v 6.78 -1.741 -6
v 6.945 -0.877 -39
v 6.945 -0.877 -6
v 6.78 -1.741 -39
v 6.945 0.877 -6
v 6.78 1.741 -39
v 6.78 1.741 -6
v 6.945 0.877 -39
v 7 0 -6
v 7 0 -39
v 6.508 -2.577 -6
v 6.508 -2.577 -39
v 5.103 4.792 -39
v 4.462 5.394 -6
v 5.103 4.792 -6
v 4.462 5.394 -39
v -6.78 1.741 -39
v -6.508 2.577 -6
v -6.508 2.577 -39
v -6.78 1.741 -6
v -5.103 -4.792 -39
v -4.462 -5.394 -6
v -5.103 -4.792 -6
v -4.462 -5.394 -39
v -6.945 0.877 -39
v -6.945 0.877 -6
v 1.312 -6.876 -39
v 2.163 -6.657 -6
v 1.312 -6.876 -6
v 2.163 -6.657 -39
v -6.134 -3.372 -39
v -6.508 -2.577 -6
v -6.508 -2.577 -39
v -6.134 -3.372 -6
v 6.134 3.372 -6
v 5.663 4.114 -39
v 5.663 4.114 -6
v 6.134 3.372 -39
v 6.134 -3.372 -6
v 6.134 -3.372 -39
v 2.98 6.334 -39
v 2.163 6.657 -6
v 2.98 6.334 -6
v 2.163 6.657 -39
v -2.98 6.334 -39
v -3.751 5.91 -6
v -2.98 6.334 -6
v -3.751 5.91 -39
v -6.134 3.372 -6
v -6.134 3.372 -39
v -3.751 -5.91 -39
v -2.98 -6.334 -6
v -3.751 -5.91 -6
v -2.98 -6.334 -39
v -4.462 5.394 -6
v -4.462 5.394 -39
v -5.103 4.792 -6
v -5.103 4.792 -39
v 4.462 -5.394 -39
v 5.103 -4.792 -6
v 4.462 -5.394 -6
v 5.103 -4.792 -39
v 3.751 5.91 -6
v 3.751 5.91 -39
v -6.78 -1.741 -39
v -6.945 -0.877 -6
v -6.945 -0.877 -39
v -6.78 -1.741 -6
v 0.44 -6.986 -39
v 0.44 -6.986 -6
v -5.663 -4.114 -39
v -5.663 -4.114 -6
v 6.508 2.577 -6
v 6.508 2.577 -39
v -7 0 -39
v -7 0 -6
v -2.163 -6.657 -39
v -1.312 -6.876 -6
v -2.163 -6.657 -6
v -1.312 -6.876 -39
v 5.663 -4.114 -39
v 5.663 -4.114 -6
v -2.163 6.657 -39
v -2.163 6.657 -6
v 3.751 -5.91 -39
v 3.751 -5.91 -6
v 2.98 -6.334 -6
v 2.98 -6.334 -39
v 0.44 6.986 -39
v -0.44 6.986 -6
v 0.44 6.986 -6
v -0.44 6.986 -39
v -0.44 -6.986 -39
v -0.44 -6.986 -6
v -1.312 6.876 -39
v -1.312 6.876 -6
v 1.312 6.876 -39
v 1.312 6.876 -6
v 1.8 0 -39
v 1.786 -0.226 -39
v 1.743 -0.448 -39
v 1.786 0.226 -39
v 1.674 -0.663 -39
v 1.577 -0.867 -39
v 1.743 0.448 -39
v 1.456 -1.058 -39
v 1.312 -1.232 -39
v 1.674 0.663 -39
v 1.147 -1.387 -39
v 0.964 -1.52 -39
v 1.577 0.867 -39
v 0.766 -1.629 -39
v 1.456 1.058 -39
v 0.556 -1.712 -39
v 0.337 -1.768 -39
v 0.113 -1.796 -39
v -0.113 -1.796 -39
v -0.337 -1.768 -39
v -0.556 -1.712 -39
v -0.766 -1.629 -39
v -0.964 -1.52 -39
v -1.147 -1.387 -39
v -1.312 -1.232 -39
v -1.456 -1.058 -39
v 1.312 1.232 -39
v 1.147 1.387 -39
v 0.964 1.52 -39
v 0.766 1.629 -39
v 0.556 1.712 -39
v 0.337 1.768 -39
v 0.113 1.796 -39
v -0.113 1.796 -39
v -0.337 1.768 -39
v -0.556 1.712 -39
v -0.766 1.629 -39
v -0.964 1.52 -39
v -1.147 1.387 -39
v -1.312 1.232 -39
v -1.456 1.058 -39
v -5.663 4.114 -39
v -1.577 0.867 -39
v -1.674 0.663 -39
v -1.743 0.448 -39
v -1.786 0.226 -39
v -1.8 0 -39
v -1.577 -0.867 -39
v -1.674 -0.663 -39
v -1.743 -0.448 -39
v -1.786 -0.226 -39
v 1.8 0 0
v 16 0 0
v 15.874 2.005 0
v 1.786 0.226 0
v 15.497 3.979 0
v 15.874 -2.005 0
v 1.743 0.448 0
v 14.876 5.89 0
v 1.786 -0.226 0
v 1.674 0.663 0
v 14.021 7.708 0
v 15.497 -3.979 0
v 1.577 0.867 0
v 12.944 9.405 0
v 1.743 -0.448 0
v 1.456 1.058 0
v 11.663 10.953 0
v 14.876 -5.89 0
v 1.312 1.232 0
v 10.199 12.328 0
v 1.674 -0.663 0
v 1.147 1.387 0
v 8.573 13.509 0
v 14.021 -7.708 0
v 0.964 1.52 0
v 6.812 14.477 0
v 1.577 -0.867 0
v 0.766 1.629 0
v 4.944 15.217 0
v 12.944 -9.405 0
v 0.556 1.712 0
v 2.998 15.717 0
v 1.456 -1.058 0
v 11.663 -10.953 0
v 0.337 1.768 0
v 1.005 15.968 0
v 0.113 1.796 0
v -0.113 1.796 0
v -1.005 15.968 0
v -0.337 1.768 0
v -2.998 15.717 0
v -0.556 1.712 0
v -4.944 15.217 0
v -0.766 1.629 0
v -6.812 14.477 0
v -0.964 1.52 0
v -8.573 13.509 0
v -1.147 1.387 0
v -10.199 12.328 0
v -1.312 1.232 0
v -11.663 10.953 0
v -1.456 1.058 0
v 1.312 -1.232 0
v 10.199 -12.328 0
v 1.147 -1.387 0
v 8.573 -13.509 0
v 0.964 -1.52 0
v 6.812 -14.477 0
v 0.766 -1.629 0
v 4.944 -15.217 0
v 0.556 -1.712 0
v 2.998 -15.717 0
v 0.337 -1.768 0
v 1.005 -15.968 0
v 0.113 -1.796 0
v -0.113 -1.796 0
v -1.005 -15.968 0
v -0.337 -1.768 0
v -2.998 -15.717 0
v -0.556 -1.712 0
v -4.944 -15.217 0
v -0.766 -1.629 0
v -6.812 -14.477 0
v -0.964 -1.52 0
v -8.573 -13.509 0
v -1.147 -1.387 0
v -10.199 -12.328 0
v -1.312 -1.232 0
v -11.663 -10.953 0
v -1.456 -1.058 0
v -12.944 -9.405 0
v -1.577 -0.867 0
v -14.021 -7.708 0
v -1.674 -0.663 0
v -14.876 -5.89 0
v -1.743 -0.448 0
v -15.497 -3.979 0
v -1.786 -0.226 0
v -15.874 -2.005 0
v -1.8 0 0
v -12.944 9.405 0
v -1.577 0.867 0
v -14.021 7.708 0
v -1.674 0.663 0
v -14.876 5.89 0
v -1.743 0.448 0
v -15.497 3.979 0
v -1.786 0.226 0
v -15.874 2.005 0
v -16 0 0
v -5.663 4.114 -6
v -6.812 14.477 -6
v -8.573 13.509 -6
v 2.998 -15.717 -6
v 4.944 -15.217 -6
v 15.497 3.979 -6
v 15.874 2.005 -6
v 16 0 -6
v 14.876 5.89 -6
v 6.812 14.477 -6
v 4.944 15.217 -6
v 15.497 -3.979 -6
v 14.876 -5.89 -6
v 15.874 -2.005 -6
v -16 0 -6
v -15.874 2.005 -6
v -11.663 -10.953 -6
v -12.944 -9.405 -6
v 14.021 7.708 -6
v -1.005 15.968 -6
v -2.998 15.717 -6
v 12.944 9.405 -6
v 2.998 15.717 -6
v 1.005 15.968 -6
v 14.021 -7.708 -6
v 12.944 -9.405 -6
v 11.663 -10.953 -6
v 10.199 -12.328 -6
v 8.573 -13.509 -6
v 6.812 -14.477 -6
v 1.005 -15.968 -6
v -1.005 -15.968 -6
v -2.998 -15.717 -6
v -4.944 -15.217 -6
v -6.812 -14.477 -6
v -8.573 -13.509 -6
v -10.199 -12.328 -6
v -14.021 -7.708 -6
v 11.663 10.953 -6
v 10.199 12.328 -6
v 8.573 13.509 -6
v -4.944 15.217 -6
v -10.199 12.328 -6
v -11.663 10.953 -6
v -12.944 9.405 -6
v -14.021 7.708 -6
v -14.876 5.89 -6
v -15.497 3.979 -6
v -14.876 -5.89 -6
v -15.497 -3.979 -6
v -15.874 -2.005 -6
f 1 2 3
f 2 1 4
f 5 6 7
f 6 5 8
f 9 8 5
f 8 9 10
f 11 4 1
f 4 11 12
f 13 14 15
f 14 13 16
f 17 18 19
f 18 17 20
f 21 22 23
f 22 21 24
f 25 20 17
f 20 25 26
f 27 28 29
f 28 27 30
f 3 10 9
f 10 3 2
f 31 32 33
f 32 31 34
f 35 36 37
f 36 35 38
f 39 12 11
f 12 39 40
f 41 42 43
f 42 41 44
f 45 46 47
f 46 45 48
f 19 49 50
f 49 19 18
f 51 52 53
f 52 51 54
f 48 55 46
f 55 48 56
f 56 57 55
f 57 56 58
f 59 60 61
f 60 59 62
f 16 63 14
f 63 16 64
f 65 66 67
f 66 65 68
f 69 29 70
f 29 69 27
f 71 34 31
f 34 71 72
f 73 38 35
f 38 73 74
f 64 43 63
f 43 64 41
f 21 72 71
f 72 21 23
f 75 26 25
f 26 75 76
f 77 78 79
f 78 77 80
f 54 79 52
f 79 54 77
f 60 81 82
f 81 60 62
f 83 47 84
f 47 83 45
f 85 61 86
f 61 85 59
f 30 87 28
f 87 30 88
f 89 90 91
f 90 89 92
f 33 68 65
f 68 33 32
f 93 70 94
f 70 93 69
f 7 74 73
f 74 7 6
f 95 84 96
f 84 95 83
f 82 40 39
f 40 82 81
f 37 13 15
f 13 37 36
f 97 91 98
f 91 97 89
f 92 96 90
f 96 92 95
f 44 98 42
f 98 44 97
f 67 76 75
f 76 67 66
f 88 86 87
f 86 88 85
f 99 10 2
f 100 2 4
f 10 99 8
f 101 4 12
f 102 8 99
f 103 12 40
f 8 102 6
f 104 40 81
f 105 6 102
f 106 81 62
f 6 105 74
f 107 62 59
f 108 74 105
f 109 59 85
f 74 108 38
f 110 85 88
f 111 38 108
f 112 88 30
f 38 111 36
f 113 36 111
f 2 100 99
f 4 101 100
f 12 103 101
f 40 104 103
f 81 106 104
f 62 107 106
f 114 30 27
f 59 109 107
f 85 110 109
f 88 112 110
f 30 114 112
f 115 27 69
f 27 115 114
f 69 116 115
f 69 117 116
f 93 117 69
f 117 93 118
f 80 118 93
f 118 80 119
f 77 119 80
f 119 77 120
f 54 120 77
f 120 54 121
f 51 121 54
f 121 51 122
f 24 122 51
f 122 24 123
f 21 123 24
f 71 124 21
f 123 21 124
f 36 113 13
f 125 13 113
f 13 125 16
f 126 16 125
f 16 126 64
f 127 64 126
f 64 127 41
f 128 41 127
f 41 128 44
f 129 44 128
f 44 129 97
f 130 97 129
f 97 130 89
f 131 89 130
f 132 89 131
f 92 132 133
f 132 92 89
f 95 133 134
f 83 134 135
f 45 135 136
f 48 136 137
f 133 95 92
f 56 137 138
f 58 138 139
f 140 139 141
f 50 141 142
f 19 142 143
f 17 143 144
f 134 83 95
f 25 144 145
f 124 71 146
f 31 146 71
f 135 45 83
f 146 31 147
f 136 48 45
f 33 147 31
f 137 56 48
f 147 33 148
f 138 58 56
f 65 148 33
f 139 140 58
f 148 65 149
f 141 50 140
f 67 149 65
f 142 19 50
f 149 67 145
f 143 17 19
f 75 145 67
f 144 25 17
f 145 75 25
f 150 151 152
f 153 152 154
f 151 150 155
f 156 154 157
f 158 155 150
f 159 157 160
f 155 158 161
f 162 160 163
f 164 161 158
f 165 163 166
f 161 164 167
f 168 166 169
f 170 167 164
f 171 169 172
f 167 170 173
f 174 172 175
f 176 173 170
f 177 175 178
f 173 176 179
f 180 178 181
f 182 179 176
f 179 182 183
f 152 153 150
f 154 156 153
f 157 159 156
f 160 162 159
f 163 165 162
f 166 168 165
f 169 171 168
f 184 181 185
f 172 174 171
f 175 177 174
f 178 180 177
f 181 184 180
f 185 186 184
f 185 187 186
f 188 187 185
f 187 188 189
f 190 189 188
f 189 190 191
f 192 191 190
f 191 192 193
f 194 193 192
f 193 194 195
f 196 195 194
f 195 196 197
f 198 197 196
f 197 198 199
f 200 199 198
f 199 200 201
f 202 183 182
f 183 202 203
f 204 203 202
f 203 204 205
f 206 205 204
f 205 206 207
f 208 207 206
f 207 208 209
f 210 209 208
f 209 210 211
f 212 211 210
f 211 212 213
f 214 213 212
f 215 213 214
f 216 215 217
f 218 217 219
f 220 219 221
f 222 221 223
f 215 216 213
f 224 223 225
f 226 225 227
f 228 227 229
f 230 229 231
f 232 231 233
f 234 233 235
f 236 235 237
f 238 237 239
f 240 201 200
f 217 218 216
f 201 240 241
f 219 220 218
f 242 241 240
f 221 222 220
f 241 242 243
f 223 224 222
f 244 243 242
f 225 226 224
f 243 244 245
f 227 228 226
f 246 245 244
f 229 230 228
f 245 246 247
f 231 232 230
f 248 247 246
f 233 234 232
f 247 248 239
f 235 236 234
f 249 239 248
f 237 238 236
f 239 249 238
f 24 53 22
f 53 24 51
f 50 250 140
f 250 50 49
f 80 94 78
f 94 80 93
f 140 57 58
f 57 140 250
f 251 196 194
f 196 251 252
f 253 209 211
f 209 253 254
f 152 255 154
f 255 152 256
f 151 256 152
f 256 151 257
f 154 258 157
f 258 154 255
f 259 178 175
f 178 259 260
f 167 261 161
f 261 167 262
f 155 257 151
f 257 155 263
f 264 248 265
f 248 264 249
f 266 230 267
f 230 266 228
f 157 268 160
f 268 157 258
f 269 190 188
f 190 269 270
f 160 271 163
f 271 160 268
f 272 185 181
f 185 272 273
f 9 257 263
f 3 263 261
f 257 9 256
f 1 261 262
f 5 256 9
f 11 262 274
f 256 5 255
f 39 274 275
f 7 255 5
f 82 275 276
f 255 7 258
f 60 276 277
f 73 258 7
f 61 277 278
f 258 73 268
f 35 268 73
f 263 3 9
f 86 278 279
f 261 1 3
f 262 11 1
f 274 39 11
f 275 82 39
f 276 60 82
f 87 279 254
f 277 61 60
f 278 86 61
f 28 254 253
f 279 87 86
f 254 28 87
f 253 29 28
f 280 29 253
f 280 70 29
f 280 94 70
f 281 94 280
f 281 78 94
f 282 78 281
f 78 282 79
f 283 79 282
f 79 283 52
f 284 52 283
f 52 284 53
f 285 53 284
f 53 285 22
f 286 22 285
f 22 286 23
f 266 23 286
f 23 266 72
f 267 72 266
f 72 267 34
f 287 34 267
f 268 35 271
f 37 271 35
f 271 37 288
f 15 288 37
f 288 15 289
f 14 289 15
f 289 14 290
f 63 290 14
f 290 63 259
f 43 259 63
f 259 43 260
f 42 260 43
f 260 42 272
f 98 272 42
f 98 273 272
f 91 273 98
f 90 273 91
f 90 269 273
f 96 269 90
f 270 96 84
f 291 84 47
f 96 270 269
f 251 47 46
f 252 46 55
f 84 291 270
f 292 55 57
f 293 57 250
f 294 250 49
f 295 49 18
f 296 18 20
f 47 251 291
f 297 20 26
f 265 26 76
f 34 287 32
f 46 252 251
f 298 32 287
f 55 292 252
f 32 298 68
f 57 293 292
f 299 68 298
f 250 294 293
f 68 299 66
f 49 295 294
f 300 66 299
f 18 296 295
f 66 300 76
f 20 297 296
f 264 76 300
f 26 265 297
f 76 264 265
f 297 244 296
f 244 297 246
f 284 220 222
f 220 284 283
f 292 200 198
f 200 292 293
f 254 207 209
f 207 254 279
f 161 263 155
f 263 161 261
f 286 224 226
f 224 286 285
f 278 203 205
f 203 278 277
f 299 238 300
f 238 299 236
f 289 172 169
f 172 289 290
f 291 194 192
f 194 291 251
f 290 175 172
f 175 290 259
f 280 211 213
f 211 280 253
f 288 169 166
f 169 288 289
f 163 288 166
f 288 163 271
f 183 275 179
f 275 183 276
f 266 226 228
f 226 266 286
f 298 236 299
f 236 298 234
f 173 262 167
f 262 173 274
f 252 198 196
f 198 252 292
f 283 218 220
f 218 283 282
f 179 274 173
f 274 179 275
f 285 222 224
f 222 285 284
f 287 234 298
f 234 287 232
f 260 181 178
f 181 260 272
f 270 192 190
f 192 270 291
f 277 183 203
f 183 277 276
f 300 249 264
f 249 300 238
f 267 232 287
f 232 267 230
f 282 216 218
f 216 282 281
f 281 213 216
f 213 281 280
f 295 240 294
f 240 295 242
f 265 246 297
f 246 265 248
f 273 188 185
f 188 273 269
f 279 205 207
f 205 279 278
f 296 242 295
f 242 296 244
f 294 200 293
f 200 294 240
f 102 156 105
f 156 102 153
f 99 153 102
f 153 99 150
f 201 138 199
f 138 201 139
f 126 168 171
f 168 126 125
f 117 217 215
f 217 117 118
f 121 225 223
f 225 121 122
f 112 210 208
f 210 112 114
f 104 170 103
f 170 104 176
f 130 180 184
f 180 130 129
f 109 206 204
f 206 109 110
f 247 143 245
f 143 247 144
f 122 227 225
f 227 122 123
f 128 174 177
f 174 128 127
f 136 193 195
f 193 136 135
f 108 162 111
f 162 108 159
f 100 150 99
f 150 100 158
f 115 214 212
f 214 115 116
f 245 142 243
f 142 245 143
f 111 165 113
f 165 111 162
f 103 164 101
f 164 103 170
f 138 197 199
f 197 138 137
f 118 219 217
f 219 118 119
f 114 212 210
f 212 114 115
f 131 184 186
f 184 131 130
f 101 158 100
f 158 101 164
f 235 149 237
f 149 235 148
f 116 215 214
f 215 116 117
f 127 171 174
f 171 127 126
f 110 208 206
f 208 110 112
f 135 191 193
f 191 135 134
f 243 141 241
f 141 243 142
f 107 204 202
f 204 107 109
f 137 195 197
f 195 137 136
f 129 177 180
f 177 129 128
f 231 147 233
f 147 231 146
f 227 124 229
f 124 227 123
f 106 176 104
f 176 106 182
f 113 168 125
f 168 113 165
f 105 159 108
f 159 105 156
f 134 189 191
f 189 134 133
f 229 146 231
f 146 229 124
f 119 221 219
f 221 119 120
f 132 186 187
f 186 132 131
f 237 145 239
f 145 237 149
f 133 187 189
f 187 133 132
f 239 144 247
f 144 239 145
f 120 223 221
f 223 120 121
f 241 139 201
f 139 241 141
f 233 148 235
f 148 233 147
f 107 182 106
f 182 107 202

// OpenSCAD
$fn = 50;


difference() {
	union() {
		translate(v = [0, 0, -39.0000000000]) {
			cylinder(h = 39, r = 7.0000000000);
		}
		translate(v = [0, 0, -6.0000000000]) {
			cylinder(h = 6, r = 16.0000000000);
		}
	}
	union() {
		#translate(v = [0, 0, -39]) {
			cylinder(h = 39, r = 1.8000000000);
		}
	}
}
